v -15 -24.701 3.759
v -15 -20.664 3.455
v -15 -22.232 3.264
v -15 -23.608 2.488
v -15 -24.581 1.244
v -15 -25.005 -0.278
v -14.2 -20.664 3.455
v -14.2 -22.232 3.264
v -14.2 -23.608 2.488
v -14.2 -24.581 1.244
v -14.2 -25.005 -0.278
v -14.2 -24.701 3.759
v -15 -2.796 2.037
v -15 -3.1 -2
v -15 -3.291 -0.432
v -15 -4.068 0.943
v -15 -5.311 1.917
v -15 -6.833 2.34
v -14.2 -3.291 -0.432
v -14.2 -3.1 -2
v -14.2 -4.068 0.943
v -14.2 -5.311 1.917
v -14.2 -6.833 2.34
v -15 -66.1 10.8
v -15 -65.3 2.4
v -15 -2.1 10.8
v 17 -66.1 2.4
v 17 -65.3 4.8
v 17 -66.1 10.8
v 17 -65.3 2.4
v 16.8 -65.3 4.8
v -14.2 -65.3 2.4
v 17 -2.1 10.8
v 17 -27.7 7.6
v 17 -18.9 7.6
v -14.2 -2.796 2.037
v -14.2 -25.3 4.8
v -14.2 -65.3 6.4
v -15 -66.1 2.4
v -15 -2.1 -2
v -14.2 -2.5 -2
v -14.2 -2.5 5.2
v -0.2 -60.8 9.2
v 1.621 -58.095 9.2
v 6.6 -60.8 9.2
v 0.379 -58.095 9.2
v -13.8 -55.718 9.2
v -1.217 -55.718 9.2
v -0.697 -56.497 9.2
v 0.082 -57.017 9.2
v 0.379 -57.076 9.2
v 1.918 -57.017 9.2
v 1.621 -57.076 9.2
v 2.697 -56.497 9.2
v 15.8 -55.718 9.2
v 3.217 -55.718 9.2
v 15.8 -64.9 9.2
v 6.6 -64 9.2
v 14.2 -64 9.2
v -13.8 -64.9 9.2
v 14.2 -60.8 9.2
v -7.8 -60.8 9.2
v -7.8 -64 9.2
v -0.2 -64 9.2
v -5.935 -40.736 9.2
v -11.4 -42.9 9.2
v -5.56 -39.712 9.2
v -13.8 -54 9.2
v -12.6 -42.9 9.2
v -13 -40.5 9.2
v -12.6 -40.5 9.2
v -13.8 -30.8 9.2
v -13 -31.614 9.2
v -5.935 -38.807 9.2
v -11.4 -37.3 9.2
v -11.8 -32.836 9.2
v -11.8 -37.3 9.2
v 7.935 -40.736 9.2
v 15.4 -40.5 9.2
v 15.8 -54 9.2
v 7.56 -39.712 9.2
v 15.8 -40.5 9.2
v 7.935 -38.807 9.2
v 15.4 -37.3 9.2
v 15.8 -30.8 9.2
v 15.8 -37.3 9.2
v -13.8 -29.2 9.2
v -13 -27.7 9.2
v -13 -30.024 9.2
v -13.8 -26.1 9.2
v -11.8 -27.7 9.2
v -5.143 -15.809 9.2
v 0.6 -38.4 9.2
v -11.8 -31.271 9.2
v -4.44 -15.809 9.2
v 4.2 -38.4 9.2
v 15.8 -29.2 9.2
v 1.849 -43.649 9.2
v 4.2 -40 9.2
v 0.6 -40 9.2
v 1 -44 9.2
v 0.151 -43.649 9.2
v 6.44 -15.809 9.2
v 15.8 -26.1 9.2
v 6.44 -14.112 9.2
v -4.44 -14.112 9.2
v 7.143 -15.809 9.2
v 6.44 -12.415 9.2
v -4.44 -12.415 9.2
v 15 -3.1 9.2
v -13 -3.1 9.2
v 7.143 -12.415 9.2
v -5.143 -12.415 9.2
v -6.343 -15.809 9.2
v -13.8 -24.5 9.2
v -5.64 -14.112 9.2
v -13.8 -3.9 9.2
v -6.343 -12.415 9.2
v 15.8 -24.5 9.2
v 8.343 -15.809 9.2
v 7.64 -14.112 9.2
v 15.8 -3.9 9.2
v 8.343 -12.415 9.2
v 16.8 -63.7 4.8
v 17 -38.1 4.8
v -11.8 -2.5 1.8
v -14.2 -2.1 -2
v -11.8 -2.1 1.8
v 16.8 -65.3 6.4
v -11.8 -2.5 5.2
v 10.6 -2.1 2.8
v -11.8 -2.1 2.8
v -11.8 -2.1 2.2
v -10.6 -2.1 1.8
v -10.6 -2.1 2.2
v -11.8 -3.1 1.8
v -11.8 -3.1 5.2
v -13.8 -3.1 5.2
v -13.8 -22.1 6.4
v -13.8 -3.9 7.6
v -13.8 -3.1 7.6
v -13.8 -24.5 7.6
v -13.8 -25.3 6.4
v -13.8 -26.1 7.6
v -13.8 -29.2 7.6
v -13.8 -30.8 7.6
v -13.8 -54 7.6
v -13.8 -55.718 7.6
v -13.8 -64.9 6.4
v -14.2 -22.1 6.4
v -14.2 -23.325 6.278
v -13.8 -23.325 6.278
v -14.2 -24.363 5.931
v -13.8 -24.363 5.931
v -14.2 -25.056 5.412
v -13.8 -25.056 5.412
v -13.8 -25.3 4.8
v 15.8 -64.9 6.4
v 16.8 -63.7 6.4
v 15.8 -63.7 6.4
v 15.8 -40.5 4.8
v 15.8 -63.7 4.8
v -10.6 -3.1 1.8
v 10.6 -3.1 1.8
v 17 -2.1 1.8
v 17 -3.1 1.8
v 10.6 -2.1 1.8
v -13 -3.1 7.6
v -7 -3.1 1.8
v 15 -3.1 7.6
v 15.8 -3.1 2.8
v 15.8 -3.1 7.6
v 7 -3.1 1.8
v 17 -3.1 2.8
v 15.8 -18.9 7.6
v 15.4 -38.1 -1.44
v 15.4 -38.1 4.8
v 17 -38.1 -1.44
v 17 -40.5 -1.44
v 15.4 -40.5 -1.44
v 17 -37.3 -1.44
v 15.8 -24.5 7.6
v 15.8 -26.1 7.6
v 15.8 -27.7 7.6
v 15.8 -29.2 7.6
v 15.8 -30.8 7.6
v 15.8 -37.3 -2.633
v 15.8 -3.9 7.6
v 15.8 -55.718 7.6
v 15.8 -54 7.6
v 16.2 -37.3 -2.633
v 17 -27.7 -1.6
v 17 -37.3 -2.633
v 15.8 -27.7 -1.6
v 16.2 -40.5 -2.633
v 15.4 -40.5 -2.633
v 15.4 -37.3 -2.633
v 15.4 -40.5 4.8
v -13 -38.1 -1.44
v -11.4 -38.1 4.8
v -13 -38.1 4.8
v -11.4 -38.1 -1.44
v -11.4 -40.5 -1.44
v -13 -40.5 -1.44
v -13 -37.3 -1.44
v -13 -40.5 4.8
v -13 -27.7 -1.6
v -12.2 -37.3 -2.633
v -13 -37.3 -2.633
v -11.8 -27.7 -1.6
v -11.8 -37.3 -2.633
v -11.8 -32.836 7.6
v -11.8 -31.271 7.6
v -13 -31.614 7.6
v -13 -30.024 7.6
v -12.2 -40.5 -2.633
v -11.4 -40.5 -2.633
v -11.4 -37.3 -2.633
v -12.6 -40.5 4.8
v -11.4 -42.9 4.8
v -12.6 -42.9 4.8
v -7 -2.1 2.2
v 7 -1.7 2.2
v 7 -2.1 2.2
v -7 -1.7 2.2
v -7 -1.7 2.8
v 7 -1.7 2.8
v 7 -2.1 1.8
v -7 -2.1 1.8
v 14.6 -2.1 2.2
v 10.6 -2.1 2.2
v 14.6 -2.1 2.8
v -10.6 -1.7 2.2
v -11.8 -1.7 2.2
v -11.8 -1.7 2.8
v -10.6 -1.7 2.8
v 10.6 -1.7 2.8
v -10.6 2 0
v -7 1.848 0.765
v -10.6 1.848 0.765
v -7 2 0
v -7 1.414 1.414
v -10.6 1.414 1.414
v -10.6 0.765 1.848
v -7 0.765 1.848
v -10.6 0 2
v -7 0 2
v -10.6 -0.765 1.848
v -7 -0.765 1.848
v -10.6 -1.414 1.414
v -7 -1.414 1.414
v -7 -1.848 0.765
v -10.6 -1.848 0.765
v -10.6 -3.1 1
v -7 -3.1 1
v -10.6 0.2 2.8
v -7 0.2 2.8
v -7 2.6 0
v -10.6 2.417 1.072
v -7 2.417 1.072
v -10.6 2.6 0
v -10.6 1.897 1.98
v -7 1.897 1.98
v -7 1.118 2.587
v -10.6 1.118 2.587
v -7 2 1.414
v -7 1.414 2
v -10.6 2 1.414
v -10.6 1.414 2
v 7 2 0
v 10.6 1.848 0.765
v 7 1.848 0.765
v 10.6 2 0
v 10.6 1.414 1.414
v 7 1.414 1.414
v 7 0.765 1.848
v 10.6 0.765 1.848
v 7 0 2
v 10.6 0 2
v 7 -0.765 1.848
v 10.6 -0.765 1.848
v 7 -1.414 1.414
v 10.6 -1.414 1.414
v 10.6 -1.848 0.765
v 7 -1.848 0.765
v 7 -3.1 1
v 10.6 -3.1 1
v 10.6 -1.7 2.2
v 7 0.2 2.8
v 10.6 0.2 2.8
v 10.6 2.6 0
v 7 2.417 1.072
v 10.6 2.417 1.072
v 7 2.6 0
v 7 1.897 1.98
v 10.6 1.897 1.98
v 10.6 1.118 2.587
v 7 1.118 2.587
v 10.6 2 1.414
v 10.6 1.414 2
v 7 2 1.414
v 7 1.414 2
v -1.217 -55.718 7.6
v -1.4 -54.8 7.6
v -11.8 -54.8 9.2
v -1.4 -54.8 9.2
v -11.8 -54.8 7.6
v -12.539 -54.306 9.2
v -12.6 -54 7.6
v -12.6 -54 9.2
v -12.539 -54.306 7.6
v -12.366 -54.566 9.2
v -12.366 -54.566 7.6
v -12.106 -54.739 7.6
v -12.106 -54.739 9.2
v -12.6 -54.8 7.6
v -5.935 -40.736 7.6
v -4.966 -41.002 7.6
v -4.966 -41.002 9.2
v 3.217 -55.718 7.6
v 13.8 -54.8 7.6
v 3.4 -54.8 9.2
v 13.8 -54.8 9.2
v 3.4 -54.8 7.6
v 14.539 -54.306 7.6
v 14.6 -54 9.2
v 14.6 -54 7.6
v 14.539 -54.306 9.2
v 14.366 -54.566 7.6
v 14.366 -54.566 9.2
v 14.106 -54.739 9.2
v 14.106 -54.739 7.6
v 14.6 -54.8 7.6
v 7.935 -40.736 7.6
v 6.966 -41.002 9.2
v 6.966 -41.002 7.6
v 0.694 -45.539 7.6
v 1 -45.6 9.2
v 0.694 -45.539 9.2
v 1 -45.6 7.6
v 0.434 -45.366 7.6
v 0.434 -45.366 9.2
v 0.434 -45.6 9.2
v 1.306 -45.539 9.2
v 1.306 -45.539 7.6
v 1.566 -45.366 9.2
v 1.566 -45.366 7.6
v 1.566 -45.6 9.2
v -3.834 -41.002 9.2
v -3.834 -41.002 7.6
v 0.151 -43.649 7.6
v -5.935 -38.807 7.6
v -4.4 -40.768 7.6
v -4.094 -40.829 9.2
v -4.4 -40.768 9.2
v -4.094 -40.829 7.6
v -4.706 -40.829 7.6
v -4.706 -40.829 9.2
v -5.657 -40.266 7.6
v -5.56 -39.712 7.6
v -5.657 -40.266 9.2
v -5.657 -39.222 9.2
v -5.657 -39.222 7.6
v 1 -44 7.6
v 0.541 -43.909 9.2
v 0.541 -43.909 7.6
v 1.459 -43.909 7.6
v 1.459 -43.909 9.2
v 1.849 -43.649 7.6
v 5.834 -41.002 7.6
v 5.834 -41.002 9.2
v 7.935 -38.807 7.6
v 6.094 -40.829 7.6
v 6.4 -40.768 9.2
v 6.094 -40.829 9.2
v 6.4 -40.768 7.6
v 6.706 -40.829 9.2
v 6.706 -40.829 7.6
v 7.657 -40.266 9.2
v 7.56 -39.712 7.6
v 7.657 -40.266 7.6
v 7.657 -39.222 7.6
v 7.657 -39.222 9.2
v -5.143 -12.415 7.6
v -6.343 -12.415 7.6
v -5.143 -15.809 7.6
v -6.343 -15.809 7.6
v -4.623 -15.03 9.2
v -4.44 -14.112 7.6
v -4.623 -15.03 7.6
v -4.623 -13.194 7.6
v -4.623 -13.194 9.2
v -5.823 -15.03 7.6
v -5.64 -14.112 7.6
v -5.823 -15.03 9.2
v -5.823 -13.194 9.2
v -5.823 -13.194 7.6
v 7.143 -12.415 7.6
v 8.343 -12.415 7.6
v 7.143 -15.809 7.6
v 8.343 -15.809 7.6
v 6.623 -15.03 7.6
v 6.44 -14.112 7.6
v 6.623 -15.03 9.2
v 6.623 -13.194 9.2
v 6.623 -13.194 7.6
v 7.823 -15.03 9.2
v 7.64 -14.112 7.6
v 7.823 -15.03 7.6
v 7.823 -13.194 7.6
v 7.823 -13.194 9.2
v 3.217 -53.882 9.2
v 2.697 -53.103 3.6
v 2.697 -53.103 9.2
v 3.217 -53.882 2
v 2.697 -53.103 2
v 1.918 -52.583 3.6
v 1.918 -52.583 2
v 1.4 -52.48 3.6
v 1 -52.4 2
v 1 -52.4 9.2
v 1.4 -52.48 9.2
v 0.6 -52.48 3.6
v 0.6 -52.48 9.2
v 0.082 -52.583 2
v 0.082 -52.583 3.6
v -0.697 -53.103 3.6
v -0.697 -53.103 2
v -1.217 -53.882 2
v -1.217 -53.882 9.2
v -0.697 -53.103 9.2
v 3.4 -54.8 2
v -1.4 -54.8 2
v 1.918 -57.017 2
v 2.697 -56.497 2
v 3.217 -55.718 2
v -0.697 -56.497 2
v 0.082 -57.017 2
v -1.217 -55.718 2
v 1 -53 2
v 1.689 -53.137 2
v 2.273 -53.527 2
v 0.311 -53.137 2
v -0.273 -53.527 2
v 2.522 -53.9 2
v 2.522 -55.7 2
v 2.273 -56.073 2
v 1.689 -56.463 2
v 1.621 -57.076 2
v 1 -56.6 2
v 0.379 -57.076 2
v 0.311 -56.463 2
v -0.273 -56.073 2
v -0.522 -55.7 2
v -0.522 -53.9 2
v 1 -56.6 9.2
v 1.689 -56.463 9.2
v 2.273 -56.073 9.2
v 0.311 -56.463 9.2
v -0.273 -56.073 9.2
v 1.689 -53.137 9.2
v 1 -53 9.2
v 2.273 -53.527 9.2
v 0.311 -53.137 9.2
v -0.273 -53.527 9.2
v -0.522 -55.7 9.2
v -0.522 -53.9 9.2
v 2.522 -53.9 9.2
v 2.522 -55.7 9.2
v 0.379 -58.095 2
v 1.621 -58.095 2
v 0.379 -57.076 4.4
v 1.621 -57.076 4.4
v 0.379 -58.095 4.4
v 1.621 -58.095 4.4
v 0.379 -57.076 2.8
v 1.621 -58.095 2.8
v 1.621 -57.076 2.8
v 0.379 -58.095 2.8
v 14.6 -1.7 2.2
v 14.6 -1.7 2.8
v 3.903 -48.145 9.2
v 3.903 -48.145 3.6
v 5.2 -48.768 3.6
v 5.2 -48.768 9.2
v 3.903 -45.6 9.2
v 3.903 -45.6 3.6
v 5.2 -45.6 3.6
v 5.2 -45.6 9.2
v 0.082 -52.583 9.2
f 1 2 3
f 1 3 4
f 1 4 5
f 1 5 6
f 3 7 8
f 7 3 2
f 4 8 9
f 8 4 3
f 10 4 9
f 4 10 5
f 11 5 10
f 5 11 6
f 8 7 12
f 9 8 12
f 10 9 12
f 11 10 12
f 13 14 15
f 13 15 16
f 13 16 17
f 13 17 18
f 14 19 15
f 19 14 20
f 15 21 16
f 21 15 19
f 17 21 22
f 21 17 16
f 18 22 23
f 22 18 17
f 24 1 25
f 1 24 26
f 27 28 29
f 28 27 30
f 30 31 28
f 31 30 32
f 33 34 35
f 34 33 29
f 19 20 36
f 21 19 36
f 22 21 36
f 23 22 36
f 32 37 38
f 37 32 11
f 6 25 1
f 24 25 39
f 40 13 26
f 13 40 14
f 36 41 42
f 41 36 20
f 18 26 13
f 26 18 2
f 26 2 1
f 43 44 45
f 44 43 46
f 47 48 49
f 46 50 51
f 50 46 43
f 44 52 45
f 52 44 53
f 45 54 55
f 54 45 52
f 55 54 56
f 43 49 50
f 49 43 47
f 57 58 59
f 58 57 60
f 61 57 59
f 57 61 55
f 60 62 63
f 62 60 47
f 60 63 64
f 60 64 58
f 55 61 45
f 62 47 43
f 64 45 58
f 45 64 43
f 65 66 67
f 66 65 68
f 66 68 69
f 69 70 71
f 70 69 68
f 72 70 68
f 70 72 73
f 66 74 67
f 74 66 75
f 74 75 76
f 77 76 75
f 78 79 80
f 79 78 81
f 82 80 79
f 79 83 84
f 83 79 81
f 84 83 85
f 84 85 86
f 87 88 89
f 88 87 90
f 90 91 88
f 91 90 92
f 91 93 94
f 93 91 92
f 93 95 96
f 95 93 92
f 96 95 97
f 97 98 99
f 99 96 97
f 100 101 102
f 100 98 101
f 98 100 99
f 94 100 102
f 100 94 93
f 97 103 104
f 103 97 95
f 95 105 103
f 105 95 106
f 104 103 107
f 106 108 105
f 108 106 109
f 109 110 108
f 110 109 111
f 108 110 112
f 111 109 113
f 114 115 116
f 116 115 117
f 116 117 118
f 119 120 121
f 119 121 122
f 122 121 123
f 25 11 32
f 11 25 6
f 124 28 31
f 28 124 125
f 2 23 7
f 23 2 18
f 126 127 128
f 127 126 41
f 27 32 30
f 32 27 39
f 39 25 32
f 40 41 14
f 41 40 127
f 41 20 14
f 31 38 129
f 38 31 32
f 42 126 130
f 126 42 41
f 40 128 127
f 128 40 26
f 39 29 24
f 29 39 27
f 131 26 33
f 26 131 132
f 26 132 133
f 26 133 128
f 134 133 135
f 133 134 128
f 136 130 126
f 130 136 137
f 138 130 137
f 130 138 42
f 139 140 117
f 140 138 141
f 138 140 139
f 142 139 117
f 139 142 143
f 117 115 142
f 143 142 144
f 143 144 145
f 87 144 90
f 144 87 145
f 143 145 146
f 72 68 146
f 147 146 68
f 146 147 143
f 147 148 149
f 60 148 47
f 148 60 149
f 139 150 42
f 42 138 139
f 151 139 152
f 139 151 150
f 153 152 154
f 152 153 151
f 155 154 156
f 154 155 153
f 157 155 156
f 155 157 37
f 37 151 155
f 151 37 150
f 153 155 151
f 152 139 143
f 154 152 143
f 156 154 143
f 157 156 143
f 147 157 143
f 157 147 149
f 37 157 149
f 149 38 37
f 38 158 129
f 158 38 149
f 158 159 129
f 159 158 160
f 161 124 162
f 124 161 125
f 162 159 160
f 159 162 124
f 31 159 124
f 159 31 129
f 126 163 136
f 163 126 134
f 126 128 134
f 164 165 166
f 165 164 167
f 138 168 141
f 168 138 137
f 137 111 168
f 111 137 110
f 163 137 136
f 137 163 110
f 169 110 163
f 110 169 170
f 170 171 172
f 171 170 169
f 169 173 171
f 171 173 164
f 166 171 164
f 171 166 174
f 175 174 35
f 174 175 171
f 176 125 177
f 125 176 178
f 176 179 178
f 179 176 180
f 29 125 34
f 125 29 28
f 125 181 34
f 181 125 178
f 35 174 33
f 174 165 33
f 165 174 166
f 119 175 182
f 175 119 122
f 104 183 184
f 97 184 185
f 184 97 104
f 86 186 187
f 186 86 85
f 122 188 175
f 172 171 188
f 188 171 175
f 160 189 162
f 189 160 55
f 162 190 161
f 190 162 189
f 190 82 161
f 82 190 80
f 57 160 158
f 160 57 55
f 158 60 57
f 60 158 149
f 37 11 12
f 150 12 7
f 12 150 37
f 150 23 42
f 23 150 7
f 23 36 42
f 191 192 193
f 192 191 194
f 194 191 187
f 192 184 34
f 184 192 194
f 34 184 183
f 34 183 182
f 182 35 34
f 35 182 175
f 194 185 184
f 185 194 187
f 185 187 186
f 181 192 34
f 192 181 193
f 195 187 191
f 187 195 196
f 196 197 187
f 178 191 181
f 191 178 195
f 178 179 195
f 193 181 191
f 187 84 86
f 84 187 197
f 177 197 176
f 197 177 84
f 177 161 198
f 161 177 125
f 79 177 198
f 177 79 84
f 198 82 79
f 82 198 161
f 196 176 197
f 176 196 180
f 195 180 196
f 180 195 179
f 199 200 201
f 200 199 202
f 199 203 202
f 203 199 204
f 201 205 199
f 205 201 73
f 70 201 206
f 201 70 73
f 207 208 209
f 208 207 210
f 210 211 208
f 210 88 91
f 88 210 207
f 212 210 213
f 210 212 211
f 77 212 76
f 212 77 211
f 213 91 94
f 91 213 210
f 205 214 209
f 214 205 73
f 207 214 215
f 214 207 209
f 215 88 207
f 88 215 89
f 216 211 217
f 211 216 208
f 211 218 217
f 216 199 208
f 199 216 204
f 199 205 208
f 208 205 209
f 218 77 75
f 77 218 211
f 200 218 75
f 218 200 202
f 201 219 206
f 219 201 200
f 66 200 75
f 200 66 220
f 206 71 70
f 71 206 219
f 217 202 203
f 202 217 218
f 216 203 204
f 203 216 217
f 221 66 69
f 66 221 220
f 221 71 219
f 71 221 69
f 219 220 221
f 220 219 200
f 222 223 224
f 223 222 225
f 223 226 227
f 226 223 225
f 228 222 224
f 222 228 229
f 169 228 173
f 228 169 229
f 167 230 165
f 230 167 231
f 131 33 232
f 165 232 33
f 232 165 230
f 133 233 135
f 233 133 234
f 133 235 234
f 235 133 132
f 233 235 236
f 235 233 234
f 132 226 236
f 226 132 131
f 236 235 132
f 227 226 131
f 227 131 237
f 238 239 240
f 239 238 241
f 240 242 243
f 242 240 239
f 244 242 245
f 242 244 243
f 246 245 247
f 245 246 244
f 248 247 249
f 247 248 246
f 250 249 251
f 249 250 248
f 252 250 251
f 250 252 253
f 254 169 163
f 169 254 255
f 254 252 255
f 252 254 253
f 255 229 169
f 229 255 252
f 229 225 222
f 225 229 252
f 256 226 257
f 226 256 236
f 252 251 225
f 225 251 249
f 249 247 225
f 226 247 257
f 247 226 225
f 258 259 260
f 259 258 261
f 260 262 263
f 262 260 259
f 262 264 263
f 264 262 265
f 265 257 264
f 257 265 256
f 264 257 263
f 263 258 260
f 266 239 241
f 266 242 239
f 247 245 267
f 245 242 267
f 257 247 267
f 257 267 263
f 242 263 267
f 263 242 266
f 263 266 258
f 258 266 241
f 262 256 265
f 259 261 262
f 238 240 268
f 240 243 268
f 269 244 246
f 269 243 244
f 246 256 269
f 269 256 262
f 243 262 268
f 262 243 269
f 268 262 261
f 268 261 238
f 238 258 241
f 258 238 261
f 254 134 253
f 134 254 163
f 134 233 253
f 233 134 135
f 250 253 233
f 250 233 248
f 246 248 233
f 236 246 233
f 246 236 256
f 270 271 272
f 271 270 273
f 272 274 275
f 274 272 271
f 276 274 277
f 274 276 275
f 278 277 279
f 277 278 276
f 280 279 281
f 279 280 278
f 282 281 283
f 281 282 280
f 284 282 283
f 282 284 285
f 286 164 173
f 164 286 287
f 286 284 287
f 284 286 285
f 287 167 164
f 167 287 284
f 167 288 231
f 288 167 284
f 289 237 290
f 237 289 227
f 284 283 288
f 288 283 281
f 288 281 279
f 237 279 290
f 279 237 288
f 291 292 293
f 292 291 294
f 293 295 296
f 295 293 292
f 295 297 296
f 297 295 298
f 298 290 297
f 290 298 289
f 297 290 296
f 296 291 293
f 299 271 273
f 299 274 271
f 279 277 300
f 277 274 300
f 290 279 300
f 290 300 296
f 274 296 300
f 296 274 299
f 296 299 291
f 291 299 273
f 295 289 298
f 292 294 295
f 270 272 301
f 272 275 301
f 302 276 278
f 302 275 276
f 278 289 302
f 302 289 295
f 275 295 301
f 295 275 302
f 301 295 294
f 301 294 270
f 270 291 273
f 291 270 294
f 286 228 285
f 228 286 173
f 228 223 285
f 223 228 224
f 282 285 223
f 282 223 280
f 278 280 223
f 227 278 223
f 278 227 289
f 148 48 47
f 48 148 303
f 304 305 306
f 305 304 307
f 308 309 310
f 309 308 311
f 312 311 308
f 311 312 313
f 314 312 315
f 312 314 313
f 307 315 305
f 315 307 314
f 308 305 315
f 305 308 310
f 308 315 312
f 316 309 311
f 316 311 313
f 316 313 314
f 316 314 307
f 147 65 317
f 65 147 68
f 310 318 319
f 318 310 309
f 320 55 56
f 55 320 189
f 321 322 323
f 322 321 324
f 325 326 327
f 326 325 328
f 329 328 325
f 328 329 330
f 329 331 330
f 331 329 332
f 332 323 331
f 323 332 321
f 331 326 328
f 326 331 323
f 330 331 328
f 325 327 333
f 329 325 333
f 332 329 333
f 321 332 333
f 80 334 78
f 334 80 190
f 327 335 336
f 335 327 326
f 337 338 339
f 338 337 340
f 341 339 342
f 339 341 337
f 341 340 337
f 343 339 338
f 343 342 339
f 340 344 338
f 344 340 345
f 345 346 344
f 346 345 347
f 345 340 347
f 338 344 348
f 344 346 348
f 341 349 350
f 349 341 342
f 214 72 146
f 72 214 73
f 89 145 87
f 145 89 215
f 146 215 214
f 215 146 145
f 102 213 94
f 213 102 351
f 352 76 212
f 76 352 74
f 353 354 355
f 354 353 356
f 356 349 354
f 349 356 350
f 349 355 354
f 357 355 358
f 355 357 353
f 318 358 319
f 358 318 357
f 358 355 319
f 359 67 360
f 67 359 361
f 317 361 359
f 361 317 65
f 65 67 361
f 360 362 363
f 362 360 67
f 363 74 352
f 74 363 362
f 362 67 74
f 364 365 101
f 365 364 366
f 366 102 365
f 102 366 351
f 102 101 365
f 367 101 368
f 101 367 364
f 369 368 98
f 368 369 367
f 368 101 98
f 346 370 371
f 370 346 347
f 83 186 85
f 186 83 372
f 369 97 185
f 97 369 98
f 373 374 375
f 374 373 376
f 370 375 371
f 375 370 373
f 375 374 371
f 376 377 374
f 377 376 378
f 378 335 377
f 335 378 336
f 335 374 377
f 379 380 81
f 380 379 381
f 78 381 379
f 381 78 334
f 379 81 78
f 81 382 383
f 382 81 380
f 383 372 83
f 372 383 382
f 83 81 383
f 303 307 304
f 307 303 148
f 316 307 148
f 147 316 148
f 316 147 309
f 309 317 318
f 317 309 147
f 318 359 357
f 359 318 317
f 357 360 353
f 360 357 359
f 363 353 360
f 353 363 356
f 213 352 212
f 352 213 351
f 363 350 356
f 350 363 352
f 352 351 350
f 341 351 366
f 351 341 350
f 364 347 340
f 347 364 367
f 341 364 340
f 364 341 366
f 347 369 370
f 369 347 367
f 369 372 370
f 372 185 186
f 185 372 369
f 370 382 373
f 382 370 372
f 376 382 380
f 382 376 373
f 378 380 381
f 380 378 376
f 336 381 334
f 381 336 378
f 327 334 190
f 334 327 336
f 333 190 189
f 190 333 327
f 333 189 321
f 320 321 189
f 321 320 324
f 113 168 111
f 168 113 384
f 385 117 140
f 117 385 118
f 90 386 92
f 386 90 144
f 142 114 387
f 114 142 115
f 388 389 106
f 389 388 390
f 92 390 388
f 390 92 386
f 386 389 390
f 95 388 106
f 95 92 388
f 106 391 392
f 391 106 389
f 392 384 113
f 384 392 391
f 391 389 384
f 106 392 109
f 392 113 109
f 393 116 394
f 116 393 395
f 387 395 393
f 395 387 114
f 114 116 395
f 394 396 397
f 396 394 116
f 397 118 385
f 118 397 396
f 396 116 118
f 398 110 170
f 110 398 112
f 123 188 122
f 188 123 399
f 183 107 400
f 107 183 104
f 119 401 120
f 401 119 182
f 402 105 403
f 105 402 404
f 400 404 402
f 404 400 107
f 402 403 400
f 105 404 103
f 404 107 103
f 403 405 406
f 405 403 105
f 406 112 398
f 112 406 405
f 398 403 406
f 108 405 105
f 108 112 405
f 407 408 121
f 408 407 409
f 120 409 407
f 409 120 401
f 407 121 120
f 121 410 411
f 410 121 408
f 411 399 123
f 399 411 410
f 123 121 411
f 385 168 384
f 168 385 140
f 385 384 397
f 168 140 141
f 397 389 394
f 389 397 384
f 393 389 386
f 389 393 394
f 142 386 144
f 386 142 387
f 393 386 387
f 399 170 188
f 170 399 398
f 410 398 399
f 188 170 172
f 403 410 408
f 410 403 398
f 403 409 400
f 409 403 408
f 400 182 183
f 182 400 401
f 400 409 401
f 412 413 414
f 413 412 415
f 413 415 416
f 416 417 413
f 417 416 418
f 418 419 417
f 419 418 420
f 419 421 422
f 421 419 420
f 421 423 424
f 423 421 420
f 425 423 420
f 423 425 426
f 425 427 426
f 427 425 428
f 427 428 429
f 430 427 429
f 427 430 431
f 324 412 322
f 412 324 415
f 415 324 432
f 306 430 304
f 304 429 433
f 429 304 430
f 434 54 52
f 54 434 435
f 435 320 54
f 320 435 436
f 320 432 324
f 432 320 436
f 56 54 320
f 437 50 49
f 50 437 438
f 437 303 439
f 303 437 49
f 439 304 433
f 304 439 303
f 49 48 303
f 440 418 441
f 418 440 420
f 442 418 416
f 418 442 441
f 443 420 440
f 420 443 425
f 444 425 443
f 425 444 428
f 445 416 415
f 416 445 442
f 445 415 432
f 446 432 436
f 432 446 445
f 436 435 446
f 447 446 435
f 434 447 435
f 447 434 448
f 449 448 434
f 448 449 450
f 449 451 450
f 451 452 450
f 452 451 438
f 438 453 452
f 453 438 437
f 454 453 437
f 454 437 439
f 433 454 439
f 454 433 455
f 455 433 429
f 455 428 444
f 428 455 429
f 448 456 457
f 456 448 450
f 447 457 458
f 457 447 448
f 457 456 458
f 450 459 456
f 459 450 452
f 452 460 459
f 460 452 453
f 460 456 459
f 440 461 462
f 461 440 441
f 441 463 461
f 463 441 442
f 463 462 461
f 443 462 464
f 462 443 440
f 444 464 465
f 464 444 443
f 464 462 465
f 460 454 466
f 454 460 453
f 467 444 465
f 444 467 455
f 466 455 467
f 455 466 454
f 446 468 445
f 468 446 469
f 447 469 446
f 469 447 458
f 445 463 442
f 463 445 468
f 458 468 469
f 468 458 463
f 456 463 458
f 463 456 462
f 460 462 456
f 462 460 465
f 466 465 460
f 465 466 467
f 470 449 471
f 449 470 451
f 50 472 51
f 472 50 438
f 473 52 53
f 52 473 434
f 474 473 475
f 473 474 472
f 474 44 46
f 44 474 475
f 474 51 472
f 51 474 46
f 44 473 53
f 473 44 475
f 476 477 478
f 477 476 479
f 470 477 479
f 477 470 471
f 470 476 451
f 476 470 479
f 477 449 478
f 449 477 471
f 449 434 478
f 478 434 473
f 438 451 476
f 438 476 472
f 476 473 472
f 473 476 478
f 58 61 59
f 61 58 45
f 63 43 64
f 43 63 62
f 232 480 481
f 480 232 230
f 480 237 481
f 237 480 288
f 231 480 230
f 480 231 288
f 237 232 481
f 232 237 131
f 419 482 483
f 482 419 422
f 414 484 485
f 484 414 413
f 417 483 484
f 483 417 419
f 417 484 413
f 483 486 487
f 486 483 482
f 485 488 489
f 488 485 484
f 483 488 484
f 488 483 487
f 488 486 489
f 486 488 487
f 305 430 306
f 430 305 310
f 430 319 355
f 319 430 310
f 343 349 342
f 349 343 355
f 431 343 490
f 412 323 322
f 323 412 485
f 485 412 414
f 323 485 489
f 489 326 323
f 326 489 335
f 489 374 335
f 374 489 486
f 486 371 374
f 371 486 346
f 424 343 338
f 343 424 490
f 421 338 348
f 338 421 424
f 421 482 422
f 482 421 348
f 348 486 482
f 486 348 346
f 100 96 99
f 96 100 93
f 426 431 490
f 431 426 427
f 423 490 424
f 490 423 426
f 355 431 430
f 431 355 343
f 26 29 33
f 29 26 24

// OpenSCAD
use <../lib.scad>
use <s/4112s01.scad>
use <s/4112s03.scad>
function ldraw_lib__4112() = [
// 0 ~Electric Switch: Key Left
// 0 Name: 4112.dat
// 0 Author: Javier Orquera [kuramapika1]
// 0 !LDRAW_ORG Part UPDATE 2025-09
// 0 !LICENSE Licensed under CC BY 4.0 : see CAreadme.txt
// 
// 0 !HELP to put this part into a pressed-down state, rotate it 4.3 degrees
// 0 !HELP around the x-axis
// 
// 0 BFC CERTIFY CCW
  [0,"BFC","CERTIFY"],
  [0,"BFC","CCW"],
// 
// 0 !KEYWORDS control, dacta, Technic, Train
// 
// 0 !HISTORY 2025-04-24 [kuramapika1] Adapted surfaces
// 0 !HISTORY 2025-09-11 [kuramapika1] Use of new subfile
// 0 !HISTORY 2025-09-29 [OrionP] Official Update 2025-09
// 
// 1 16 0 0 0 1 0 0 0 1 0 0 0 1 s\4112s01.dat
  [1,16,0,0,0,1,0,0,0,1,0,0,0,1, ldraw_lib__s__4112s01()],
// 1 16 0 0 0 1 0 0 0 1 0 0 0 1 s\4112s03.dat
  [1,16,0,0,0,1,0,0,0,1,0,0,0,1, ldraw_lib__s__4112s03()],
// 4 16 42.5 -27 -5.25 -37.5 -27 -5.25 -37.5 -27 -165.25 42.5 -27 -165.25
  [4,16,42.5,-27,-5.25,-37.5,-27,-5.25,-37.5,-27,-165.25,42.5,-27,-165.25],
];
module ldraw_lib__4112(step=0, col=false, unit=2/5, alt=false, line=0.2, solid=!$preview)
    makepoly(ldraw_lib__4112(), step=step, col=col, unit=unit, alt=alt, line=line, solid=solid);
ldraw_lib__4112(line=0.2);
